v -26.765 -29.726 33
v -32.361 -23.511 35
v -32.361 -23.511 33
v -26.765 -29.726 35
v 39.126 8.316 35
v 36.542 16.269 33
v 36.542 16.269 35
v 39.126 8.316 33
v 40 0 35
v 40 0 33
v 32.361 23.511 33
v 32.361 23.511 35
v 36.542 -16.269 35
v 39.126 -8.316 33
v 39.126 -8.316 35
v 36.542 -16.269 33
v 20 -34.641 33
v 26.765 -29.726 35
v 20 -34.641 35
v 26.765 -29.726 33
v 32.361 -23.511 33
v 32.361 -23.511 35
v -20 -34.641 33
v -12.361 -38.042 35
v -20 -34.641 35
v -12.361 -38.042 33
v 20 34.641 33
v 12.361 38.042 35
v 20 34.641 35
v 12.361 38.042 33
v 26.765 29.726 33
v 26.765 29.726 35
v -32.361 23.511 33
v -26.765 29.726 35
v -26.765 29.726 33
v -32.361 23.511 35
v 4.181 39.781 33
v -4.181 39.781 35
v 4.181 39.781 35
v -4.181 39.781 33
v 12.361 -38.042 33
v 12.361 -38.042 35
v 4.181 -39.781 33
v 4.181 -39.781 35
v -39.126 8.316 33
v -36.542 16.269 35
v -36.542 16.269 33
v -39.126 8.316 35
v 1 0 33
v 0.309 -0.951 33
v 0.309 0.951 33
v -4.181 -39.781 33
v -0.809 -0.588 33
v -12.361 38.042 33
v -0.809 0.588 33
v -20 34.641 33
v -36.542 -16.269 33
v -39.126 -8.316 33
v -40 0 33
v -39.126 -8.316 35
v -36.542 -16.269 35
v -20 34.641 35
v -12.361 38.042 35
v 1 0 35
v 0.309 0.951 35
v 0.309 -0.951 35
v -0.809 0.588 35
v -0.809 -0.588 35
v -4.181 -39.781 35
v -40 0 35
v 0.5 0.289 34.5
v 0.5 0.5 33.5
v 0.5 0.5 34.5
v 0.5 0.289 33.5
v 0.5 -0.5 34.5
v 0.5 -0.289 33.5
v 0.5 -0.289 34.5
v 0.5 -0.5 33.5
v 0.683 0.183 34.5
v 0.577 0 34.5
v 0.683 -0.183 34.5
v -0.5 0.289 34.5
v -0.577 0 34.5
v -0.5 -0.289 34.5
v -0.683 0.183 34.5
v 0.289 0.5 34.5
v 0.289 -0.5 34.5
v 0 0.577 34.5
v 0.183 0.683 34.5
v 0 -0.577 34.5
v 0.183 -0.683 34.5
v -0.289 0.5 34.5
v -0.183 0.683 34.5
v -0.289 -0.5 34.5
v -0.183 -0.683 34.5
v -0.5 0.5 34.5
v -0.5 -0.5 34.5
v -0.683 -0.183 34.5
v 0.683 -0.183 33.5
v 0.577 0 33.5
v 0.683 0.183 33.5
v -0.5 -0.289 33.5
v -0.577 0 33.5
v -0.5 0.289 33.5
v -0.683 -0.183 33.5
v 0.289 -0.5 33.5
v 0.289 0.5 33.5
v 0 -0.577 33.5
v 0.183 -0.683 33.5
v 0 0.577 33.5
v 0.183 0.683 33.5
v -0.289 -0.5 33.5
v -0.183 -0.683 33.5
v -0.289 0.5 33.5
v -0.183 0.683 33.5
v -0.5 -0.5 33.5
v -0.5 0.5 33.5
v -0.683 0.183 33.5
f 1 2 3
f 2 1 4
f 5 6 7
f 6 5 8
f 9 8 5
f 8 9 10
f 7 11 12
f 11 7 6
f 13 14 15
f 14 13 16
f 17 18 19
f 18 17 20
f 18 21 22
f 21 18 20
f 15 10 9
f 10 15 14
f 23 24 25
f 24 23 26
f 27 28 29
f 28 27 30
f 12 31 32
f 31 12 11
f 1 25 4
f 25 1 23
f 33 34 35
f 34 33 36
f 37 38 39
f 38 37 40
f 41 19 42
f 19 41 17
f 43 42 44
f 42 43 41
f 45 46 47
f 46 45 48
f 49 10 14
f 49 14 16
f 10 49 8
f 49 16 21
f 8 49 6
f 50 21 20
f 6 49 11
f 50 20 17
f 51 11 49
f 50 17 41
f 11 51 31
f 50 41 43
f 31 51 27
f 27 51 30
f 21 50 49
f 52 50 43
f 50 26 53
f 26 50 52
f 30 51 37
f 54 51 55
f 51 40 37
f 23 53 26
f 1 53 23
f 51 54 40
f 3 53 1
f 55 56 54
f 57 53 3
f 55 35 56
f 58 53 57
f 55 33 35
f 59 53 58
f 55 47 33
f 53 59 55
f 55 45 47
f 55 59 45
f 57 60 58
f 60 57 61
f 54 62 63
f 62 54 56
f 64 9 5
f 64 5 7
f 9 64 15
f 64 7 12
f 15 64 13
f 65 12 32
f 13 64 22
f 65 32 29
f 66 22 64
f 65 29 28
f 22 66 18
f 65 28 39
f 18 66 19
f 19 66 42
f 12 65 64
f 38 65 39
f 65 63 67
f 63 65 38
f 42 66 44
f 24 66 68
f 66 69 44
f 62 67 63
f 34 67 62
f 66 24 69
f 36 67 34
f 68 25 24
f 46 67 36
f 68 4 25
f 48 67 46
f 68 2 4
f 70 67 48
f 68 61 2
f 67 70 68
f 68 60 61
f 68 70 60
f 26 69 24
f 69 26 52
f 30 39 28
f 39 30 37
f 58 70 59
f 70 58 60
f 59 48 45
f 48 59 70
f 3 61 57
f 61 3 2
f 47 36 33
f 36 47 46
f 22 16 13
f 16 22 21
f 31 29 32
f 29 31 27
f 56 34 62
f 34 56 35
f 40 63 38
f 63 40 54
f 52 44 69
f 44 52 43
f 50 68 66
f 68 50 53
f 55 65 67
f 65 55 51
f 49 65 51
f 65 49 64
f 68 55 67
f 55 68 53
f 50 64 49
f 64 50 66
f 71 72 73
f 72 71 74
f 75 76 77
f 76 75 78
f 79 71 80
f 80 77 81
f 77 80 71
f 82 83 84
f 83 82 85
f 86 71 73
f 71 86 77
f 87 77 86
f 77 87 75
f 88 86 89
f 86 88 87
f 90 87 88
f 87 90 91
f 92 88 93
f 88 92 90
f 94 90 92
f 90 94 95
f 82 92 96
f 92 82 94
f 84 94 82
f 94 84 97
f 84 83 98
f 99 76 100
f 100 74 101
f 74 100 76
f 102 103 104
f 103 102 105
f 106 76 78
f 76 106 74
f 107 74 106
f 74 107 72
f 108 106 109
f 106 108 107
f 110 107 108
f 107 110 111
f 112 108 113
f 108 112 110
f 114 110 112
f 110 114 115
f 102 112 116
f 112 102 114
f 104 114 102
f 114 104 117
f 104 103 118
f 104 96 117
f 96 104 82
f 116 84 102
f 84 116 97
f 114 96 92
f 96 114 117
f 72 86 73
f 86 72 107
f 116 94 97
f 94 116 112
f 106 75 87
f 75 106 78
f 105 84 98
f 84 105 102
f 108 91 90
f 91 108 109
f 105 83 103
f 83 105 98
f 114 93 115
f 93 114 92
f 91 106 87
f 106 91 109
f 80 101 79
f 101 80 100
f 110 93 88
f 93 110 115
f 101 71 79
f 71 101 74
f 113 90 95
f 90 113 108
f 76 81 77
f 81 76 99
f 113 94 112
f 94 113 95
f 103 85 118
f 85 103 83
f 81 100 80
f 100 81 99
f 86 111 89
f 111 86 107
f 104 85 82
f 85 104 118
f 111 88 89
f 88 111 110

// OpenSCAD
// file: drain-cover.scad
module drain_cover(outer_radius, inner_radius, height)
{
    top_thin = 7;
    thin = 2;
    edge_len = outer_radius - inner_radius;

    // top
    translate(v = [ 0, 0, 0.5 * (height - top_thin) ])
        circular_net(radius = outer_radius, height = top_thin, outer_width = edge_len + thin, hole_width = 5);

    // side
    side_net(height = height, top_radius = inner_radius, thin = thin, hole_width = 2);

    // bottom
    translate(v = [ 0, 0, -0.5 * (height - thin) ])
        circular_net(radius = 0.8 * inner_radius, height = thin, outer_width = 2, hole_width = 2);
}

module side_net(height, top_radius, thin, hole_width)
{
    difference()
    {
        base_side(height = height, top_radius = top_radius, thin = thin);

        net_width = 0.8 * hole_width;
        d_radian = (hole_width + net_width) / (0.9 * top_radius);
        d_degree = d_radian * 180 / PI;
        for (angle = [0:d_degree:180])
        {
            rotate([ 0, 0, angle ]) cube(size = [ 2 * top_radius, hole_width, 0.9 * height ], center = true);
        }
    }
}

module base_side(height, top_radius, thin)
{
    difference()
    {
        cylinder(h = height, r1 = 0.8 * top_radius, r2 = top_radius, center = true);
        cylinder(h = height + 1, r1 = 0.8 * top_radius - thin, r2 = top_radius - thin, center = true);
    }
}

module circular_net(radius, height, outer_width, hole_width)
{
    center = true;

    // 外側の縁部分
    ring(outer_radius = radius, height = height, width = outer_width, center = center);

    // 同心円状の網部分
    net_width = 0.8 * hole_width;
    for (ring_radius = [radius - outer_width - hole_width:-(net_width + hole_width):0])
    {
        ring(outer_radius = ring_radius, height = height, width = net_width, center = center);
    }

    // 網を支える棒部分
    bar_num = 3;
    bar_width = 1.2 * hole_width;
    for (angle = [0:180 / bar_num:180])
    {
        rotate([ 0, 0, angle ]) cube(size = [ 2 * radius - outer_width, bar_width, height ], center = true);
    }
}

module ring(outer_radius, width, height, center)
{
    difference()
    {
        cylinder(h = height, r = outer_radius, center = center);
        cylinder(h = height + 1, r = outer_radius - width, center = center);
    }
}

drain_cover(outer_radius = 50, inner_radius = 35, height = 30);
// main file
use <drain-cover.scad>

module drain_cover(radius, edge_len, height, sharpness, top_thin, thin)
{
    side_height = height - top_thin;

    // top
    translate(v = [ 0, 0, side_height + 0.5 * top_thin ])
        circular_net(
          radius = radius,
          edge_len = edge_len + thin,
          height = top_thin,
          hole_width = 8,
          net_width = 3
        );

    // side
    side_net(
      radius = radius - edge_len,
      height = side_height,
      factorial = sharpness,
      thin = thin,
      hole_width = 2,
      net_width = 2
    );
}
drain_cover(
  radius = 40,
  edge_len = 2,
  height = 35,
  sharpness=6,
  top_thin = 2,
  thin = 2
);
